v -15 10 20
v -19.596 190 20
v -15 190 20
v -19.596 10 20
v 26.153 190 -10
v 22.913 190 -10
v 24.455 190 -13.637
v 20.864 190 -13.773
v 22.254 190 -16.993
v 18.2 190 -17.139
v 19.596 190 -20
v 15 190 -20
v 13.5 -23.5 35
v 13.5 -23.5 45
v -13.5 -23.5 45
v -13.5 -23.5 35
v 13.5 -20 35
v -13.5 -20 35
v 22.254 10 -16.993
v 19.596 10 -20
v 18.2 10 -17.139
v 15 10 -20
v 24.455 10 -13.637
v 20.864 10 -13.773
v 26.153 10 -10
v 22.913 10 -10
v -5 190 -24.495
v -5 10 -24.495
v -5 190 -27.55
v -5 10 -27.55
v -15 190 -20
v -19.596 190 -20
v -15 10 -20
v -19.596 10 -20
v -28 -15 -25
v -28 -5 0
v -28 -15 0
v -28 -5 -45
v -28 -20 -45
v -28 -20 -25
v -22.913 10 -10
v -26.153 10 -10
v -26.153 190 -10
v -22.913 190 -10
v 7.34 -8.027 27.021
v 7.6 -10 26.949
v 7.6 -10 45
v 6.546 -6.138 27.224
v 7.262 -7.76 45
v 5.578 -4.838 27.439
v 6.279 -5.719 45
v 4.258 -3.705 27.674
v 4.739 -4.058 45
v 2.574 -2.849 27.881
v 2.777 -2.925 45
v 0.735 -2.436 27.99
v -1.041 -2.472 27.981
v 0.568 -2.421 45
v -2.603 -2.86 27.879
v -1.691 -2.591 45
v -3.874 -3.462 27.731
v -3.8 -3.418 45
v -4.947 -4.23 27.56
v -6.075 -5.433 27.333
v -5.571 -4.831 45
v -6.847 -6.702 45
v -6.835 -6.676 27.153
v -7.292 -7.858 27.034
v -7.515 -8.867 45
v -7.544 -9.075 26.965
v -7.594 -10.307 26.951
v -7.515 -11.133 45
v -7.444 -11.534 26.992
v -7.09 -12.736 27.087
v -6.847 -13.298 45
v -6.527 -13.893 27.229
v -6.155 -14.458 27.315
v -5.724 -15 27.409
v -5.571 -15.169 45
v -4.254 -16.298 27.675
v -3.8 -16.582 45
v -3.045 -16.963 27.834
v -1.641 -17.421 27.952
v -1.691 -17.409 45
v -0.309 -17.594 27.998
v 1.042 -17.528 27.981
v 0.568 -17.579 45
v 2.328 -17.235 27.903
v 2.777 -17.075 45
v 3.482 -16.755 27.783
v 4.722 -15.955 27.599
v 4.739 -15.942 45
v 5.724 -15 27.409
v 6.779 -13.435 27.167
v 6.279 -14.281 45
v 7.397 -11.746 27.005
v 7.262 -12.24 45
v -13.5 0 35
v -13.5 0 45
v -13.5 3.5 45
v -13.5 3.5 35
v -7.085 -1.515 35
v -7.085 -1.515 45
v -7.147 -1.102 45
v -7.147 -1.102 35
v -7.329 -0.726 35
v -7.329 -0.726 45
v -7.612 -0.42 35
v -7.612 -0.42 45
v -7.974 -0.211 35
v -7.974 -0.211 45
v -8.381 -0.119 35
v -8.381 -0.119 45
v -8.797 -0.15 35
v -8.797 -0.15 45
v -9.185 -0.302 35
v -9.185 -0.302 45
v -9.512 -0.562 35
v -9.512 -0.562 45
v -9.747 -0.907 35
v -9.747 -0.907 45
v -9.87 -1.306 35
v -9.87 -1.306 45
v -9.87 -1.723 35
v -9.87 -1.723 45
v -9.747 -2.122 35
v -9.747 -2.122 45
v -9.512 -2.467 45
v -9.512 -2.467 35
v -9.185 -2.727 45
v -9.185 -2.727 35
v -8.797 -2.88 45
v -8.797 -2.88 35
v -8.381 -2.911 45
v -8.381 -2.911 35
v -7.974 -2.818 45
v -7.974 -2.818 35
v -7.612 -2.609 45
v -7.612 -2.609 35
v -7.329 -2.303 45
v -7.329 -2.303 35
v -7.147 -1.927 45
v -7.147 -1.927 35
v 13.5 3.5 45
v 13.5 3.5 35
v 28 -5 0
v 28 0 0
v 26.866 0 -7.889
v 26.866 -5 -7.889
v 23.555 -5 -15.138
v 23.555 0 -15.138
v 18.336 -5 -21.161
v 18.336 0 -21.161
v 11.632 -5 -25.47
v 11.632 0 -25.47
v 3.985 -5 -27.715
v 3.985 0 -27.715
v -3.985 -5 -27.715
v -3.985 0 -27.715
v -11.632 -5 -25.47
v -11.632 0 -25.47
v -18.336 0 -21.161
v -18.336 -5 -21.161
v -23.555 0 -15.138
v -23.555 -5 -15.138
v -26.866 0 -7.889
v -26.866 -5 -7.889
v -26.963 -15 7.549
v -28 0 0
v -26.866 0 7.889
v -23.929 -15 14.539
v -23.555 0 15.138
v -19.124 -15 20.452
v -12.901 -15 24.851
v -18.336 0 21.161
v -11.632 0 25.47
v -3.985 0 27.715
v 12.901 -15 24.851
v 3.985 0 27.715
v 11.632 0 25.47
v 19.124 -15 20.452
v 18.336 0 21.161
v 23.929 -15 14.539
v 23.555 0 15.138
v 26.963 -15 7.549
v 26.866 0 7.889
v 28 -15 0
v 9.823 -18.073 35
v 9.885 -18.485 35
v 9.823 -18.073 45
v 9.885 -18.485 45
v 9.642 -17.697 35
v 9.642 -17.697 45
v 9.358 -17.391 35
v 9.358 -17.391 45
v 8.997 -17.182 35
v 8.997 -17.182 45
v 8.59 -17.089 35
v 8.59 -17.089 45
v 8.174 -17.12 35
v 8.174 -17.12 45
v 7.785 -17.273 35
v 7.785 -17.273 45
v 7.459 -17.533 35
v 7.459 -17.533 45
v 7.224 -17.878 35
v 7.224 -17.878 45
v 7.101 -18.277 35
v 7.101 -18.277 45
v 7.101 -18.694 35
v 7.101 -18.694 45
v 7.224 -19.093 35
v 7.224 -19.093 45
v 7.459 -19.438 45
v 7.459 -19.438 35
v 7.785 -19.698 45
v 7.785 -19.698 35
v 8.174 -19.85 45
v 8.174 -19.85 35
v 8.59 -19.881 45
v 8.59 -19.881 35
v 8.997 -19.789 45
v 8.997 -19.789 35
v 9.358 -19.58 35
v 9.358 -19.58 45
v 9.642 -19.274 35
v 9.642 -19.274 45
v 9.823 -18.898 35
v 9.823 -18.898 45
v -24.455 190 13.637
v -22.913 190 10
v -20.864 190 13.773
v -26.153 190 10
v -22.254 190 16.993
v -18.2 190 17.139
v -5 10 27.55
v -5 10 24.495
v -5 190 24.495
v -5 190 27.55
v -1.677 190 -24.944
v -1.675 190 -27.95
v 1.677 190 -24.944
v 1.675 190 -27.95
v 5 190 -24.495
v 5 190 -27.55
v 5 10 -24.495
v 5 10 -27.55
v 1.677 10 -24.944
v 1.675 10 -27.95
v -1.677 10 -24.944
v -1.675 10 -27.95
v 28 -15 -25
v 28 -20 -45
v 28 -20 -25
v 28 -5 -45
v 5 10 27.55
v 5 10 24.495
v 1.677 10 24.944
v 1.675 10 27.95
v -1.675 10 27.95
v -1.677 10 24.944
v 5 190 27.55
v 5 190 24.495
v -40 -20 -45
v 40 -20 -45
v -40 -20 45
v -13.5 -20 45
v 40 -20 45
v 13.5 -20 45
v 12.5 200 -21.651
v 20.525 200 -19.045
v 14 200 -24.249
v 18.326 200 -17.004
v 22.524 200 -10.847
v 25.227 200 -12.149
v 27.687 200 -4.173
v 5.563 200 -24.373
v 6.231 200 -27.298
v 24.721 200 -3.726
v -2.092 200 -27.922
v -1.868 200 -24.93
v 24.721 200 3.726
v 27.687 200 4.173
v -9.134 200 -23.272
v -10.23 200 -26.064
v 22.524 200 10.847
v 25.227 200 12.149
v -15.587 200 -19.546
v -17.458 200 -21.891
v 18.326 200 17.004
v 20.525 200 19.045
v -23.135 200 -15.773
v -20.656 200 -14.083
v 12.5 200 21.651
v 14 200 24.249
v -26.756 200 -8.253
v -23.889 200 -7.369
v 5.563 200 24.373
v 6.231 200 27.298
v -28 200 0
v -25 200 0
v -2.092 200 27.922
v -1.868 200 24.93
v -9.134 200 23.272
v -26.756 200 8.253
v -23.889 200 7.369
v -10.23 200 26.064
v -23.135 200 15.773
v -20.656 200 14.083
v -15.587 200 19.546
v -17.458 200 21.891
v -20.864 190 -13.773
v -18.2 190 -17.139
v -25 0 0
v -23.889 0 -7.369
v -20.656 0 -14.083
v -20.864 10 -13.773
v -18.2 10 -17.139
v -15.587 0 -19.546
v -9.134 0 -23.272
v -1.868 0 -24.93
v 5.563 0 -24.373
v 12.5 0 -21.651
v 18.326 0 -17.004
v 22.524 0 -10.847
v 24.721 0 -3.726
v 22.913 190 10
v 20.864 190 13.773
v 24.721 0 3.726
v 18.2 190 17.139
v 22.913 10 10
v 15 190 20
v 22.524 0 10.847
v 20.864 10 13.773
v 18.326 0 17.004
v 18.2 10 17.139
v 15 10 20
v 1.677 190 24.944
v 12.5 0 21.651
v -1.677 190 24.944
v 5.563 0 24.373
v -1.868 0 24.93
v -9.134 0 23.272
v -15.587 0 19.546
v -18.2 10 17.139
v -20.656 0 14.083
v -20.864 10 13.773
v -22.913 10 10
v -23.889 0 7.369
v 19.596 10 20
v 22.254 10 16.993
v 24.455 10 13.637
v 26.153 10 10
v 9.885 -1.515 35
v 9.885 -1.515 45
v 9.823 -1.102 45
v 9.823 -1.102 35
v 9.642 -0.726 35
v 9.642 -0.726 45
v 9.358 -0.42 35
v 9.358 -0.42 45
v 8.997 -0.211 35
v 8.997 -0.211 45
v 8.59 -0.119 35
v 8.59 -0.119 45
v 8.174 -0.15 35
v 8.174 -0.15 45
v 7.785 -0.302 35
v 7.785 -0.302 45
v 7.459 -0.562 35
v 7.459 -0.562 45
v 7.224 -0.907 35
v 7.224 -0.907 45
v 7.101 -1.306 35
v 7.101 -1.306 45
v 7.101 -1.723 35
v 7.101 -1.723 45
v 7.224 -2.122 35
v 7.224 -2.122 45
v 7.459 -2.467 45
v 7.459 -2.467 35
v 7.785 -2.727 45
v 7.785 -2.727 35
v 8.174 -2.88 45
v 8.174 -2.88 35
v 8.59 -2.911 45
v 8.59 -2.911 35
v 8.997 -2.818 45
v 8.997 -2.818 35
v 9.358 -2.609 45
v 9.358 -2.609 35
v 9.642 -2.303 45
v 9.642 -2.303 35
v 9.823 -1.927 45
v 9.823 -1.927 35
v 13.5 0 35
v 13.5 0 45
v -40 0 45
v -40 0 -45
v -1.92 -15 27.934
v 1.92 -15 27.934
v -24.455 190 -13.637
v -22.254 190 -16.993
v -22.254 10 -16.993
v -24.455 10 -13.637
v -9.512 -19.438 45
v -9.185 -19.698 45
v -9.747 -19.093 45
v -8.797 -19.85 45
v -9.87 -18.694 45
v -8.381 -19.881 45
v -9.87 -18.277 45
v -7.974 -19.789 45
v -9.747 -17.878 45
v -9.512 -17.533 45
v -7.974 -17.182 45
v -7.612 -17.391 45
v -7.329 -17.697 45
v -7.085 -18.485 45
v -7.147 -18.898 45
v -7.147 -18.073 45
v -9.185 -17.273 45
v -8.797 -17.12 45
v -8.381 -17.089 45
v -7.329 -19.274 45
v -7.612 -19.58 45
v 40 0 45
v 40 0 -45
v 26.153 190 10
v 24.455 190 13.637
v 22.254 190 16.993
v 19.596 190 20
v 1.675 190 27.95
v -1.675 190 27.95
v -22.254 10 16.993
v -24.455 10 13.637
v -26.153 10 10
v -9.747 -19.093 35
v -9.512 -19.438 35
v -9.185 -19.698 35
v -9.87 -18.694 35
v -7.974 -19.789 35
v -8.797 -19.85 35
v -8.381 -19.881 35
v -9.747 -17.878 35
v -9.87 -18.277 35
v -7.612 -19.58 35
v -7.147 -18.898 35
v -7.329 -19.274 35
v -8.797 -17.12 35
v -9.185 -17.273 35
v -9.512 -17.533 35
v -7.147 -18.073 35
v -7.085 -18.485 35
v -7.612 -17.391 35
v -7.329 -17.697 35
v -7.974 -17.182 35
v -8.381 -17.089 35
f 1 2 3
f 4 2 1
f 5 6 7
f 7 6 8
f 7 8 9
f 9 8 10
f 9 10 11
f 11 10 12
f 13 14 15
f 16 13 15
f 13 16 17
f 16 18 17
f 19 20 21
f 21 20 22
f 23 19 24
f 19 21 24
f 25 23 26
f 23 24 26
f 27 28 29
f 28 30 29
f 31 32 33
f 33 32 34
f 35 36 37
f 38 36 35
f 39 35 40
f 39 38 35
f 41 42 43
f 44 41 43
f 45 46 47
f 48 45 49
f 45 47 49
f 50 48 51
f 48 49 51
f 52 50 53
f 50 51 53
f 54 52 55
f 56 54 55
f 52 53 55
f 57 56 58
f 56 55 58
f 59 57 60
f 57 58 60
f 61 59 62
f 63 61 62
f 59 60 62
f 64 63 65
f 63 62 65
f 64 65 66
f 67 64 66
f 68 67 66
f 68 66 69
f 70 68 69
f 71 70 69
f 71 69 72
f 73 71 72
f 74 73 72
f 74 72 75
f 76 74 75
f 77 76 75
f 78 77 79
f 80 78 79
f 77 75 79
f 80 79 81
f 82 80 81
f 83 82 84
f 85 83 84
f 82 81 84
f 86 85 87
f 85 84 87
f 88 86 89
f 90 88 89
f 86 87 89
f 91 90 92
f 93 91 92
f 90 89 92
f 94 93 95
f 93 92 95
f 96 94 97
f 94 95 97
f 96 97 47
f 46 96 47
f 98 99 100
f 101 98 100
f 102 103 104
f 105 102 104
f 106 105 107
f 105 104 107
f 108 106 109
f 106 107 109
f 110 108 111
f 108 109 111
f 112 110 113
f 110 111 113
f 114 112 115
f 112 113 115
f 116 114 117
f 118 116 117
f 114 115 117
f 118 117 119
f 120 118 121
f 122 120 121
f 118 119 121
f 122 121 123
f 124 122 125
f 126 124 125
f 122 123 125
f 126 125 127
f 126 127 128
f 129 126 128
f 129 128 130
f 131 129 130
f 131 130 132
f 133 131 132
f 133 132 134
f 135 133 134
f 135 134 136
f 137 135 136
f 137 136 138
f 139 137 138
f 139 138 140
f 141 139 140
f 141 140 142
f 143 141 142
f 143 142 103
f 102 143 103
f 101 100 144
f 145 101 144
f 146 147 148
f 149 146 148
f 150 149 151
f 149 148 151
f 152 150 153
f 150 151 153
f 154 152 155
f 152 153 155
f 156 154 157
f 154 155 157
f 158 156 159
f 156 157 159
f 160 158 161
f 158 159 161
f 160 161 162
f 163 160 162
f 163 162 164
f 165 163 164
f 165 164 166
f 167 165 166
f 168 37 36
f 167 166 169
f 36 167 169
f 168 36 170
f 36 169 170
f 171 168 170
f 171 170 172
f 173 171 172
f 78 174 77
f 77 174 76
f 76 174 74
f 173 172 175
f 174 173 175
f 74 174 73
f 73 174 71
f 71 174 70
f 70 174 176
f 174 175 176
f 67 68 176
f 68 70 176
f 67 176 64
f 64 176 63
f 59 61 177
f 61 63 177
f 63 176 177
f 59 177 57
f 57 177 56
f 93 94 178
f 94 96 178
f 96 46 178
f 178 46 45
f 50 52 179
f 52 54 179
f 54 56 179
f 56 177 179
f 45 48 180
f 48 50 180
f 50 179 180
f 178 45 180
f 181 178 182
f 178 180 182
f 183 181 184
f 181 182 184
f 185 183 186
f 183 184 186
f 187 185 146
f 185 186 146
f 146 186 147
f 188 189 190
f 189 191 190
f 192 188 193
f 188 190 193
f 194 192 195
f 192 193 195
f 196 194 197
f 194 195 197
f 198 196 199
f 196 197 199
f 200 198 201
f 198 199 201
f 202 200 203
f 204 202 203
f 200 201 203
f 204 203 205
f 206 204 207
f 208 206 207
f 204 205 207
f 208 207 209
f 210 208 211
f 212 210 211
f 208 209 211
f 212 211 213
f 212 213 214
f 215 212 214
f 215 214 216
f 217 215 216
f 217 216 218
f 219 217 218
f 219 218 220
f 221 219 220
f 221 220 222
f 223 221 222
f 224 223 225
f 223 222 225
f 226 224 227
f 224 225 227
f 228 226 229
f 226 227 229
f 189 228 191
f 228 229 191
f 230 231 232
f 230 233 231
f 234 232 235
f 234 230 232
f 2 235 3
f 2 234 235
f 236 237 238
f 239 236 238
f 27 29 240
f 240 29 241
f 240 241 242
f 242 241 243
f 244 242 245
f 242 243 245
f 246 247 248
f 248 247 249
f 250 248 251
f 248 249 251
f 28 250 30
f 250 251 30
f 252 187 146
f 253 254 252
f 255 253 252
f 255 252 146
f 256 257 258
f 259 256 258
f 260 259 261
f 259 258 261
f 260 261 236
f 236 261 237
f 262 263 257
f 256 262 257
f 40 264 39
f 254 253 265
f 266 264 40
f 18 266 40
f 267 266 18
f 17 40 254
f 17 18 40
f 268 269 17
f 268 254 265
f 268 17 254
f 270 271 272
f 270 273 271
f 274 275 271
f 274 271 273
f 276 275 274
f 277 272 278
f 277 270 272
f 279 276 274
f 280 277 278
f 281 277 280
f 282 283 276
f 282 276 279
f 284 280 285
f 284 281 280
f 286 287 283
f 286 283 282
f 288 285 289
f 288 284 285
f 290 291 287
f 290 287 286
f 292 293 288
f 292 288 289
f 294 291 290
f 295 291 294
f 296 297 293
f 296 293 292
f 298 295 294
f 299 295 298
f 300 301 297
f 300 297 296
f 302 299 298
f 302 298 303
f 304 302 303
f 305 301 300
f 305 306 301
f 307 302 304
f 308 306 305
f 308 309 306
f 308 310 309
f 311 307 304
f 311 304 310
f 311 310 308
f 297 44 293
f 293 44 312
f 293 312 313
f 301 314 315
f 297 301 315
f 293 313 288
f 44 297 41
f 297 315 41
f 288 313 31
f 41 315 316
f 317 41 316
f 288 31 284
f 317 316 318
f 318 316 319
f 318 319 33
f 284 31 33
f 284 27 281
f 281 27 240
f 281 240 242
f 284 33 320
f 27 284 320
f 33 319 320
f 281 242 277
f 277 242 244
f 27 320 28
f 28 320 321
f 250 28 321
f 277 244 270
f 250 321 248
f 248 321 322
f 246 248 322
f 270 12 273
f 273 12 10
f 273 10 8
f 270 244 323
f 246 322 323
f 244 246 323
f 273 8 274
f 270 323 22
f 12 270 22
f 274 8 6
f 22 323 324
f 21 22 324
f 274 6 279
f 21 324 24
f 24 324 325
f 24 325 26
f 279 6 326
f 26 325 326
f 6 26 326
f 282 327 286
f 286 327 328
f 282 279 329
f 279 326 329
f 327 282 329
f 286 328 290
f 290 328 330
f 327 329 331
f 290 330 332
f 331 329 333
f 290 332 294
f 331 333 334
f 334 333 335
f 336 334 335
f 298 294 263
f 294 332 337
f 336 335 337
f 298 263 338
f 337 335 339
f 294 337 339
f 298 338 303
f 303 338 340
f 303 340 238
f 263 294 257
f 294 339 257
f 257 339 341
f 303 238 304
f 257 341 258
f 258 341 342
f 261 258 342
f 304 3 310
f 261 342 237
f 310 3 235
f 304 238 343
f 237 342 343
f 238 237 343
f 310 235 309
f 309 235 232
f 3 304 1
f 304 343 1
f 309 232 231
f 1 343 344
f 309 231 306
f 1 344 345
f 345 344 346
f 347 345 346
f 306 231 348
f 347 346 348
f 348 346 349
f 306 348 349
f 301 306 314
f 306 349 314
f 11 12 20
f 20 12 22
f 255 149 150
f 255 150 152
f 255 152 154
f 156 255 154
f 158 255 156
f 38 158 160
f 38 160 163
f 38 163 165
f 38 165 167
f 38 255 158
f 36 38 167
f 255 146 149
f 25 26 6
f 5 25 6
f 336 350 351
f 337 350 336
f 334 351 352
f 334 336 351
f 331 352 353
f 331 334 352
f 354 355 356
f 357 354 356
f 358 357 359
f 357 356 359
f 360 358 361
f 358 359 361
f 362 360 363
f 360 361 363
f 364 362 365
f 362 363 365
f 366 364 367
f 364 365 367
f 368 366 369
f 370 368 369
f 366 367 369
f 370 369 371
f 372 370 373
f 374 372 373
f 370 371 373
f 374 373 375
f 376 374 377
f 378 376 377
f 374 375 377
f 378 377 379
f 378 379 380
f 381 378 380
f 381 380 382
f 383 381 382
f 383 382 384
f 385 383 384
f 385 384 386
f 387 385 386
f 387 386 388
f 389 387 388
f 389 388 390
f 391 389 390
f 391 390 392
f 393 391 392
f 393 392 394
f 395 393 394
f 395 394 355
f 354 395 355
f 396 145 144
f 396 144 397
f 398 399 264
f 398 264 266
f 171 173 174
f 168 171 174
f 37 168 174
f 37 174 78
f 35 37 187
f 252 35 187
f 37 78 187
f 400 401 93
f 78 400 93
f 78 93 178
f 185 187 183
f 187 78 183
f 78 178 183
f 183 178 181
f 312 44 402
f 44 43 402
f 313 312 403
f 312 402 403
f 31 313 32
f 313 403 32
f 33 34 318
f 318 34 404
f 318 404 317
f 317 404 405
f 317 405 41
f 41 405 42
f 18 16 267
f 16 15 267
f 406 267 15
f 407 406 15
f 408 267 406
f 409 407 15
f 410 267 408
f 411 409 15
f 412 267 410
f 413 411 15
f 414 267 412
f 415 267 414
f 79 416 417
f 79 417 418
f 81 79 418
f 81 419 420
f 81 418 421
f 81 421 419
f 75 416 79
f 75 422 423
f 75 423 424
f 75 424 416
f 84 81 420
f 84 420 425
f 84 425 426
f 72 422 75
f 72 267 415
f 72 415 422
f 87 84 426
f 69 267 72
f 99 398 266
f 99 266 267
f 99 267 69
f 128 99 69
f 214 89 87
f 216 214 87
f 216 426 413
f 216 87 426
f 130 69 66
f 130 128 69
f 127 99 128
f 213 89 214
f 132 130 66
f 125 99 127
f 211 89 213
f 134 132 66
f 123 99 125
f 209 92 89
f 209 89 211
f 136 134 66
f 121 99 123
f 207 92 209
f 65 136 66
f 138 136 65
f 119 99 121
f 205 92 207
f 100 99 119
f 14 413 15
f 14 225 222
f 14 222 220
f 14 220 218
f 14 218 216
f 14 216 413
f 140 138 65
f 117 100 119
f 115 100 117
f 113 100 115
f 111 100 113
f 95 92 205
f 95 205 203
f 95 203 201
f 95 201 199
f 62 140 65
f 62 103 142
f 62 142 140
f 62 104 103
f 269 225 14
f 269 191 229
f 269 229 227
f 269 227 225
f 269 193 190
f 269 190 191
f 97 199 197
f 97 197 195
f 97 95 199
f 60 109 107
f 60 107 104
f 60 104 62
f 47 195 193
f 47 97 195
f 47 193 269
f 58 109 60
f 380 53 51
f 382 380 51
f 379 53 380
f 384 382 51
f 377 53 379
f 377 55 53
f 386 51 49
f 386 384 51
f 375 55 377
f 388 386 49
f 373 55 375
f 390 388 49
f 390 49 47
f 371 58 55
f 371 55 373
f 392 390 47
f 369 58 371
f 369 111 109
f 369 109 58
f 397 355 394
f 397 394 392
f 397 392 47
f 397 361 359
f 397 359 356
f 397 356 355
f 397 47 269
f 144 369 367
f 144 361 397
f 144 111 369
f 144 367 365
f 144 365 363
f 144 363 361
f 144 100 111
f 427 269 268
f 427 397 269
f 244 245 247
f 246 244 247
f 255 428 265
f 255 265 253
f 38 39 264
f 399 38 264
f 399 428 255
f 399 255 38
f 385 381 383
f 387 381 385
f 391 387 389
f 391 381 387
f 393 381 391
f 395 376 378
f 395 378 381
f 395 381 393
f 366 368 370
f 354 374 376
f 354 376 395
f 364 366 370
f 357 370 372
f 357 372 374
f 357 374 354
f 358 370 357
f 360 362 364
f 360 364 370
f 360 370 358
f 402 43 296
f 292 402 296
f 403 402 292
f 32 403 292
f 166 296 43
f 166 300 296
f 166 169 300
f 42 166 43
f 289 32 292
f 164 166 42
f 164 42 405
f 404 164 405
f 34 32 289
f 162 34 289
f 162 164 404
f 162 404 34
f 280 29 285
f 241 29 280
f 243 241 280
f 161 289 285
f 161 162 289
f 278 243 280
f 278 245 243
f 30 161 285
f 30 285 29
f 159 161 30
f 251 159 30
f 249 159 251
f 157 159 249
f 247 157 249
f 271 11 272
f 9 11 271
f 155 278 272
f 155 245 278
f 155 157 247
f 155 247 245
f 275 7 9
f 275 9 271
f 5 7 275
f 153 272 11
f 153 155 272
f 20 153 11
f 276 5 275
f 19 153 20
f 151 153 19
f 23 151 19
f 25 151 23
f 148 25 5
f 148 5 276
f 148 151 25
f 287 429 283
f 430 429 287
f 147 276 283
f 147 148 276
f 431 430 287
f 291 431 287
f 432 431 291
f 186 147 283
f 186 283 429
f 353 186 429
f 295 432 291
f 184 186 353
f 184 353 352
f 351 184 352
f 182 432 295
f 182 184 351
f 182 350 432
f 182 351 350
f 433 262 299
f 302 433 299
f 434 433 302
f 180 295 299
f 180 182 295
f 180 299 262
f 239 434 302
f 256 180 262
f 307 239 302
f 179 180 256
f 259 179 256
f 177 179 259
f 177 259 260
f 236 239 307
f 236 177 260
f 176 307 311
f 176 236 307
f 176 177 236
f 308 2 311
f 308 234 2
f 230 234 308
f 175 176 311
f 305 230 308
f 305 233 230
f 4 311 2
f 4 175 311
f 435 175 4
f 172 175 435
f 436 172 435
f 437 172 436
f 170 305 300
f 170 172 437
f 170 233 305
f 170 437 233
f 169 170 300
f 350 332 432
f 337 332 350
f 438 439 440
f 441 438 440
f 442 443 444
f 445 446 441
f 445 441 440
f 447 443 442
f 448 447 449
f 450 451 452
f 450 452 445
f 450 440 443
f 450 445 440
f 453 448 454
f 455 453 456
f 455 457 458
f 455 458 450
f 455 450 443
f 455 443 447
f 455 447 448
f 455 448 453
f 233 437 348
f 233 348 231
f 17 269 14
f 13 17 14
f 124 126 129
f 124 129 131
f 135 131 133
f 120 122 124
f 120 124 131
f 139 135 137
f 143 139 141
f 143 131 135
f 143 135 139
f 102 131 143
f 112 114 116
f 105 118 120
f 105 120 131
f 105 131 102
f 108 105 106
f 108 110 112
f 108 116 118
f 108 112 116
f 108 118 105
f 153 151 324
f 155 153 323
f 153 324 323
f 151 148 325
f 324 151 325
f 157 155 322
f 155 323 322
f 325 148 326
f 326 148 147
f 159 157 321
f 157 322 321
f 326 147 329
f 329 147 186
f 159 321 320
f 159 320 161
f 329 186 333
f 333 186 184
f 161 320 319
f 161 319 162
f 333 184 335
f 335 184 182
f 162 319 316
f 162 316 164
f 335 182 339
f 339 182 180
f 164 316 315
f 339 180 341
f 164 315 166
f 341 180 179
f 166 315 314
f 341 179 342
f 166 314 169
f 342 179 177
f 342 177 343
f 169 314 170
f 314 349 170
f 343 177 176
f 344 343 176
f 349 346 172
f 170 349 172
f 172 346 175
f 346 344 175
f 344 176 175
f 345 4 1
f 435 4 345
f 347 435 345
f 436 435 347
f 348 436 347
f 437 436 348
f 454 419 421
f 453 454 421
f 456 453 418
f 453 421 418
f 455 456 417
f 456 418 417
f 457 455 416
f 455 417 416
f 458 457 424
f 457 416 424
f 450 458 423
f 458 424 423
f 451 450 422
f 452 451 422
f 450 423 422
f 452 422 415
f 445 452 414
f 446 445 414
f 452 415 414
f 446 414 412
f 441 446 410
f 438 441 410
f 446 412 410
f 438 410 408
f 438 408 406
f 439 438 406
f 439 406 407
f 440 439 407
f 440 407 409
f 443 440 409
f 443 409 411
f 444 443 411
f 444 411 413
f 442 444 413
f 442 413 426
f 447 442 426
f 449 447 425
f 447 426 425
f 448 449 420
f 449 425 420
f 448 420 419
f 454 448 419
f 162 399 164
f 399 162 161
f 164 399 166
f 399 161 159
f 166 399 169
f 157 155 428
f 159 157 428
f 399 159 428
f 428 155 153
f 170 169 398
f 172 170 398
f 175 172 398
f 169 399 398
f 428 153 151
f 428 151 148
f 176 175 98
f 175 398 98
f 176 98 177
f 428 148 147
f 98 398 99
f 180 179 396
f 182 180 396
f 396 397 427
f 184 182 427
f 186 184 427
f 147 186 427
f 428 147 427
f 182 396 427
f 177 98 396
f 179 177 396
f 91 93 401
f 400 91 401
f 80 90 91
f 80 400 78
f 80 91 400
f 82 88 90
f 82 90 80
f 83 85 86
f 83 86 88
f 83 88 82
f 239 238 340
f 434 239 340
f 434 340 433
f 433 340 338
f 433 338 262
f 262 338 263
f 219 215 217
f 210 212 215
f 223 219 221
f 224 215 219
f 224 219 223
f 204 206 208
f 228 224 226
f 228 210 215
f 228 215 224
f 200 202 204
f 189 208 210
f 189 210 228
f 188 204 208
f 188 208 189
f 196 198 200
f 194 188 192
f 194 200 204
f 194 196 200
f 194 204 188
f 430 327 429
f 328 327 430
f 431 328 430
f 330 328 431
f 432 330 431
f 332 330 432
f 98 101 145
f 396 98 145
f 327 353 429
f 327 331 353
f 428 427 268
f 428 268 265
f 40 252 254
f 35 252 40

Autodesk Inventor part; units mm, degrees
ref_plane "YZ Plane" through (0, 0, 0) normal (1, 0, 0) x (0, 1, 0)
ref_plane "XZ Plane" through (0, 0, 0) normal (0, 1, 0) x (-1, 0, 0)
ref_plane "XY Plane" through (0, 0, 0) normal (0, 0, 1) x (1, 0, 0)
sketch "Sketch1" plane through (0, 0, 0) normal (0, 1, 0) x (-1, 0, 0)
  circle A0 centre (0, 0) radius 25
  circle A1 centre (0, 0) radius 28
  dimension "d0" = 50
  dimension "d1" = 56
extrude "Extrusion1" add sketch "Sketch1" along normal blind 200
sketch "Sketch2" plane through (0, 0, 0) normal (1, 0, 0) x (0, 1, 0)
  line L0 (0, 0) -> (0, 15)
  line L1 (0, -28) -> (0, 28) projected
  line L2 (0, 15) -> (100, 15)
  line L3 (190, 20) -> (10, 20)
  line L4 (10, 20) -> (10, 10)
  line L5 (10, 10) -> (190, 10)
  line L6 (190, 10) -> (190, 20)
  line L7 (190, 20) -> (10, 10) construction
  line L8 (10, 20) -> (190, 10) construction
  line L9 (0, 0) -> (25, 0)
  line L10 (190, -20) -> (10, -20)
  line L11 (10, -20) -> (10, -10)
  line L12 (10, -10) -> (190, -10)
  line L13 (190, -10) -> (190, -20)
  line L14 (190, -20) -> (10, -10) construction
  line L15 (10, -20) -> (190, -10) construction
  point P0 (100, -15)
  dimension "d4" = 15
  dimension "d5" = 100
  dimension "d6" = 180
  dimension "d7" = 10
  dimension "d8" = 25
extrude "Extrusion2" cut sketch "Sketch2" along normal mid plane 100
sketch "Sketch4" plane through (0, 0, 0) normal (0, 0, 1) x (1, 0, 0)
  line L0 (0, 0) -> (0, 100)
  line L1 (-5, 190) -> (5, 190)
  line L2 (5, 190) -> (5, 10)
  line L3 (5, 10) -> (-5, 10)
  line L4 (-5, 10) -> (-5, 190)
  line L5 (-5, 190) -> (5, 10) construction
  line L6 (5, 190) -> (-5, 10) construction
  dimension "d11" = 100
  dimension "d12" = 10
  dimension "d13" = 180
extrude "Extrusion3" cut sketch "Sketch4" along normal mid plane 100
sketch "Sketch5" plane through (0, 0, 0) normal (0, -1, 0) x (1, 0, 0)
  line L0 (-40, 45) -> (40, 45)
  line L1 (40, 45) -> (40, -45)
  line L2 (40, -45) -> (-40, -45)
  line L3 (-40, -45) -> (-40, 45)
  line L4 (-40, 45) -> (40, -45) construction
  line L5 (40, 45) -> (-40, -45) construction
  circle A0 centre (0, 0) radius 28
  dimension "d16" = 80
  dimension "d17" = 90
  dimension "d18" = 56
extrude "Extrusion4" add sketch "Sketch5" along normal blind 20
sketch "Sketch6" plane through (-40, 0, 45) normal (0, 0, 1) x (1, 0, 0)
  circle A0 centre (40, -10) radius 7.6
  point P0 (40, 0)
  dimension "d21" = 15.2
extrude "Extrusion5" cut sketch "Sketch6" against normal blind 20
sketch "Sketch7" plane through (0, -20, 0) normal (0, -1, 0) x (1, 0, 0)
  circle A0 centre (0, 0) radius 28 projected
extrude "Extrusion6" add sketch "Sketch7" against normal blind 5
sketch "Sketch8" plane through (40, 0, -45) normal (0, 0, -1) x (-1, 0, 0)
  line L0 (12, 0) -> (12, 200) projected
  line L1 (68, 0) -> (68, 200) projected
  line L2 (80, 0) -> (0, 0) projected
  line L3 (40, 0) -> (40, -10)
  line L4 (12, -15) -> (68, -15) projected
  line L5 (12, -5) -> (68, -5)
  line L6 (68, -5) -> (68, -15)
  line L7 (68, -15) -> (12, -15)
  line L8 (12, -15) -> (12, -5)
  circle A0 centre (40, -10) radius 7.6 projected
  line L9 (12, -5) -> (68, -15) construction
  line L10 (68, -5) -> (12, -15) construction
  point P0 (45.7236, -15)
  point P1 (34.2764, -15)
  dimension "d26" = 10
extrude "Extrusion7" cut sketch "Sketch8" against normal blind 45 contours L5 A0 L4 | L5 L6 L4 A0 | A0 L4 L8 L5
sketch "Sketch9" plane through (-40, 0, 45) normal (0, 0, 1) x (1, 0, 0)
  circle A0 centre (40, -10) radius 7.6 projected
  line L0 (26.5, 3.5) -> (53.5, 3.5)
  line L1 (53.5, 3.5) -> (53.5, -23.5)
  line L2 (53.5, -23.5) -> (26.5, -23.5)
  line L3 (26.5, -23.5) -> (26.5, 3.5)
  line L4 (26.5, 3.5) -> (53.5, -23.5) construction
  line L5 (53.5, 3.5) -> (26.5, -23.5) construction
  circle A1 centre (40, -10) radius 12
  line L6 (53.5, 3.5) -> (26.5, -23.5)
  circle A2 centre (48.4853, -1.5147) radius 1.4
  circle A3 centre (31.5147, -1.5147) radius 1.4
  circle A4 centre (31.5147, -18.4853) radius 1.4
  circle A5 centre (48.4853, -18.4853) radius 1.4
  point P0 (40, 0)
  dimension "d31" = 24
  dimension "d29" = 27
  dimension "d30" = 27
  dimension "d32" = 2.8
  dimension "d39" = 360
extrude "Extrusion8" add sketch "Sketch9" against normal blind 10 contours A0 L6 A2 A1 A5 A4 | A0 L6 A4 A1 A3 A2 | A1 A3 A4 L6 L3 L0 A2 | A2 L6 L1 L2 A4 A1 A5
extrude "Extrusion9" cut sketch "Sketch9" against normal blind 10 contours A2 A1 L6 | L6 A1 A2 | A4 A1 L6 | L6 A1 A4 | L6 A2 A1 | A1 A2 L6 | L6 A4 A1 | A1 A4 L6 | A3 A1 | A1 A3 | A5 A1 | A1 A5
sketch "Sketch10" plane through (40, 0, -45) normal (0, 0, -1) x (-1, 0, 0)
  line L0 (68, -15) -> (12, -15) projected
  line L1 (53.5, -20) -> (80, -20) projected
  line L2 (12, -10) -> (68, -10)
  line L3 (68, -10) -> (68, -20)
  line L4 (68, -20) -> (12, -20)
  line L5 (12, -20) -> (12, -10)
  line L6 (12, -10) -> (68, -20) construction
  line L7 (68, -10) -> (12, -20) construction
  point P0 (40, 0)
  point P1 (40, -15)
extrude "Extrusion10" cut sketch "Sketch10" against normal blind 20
properties part number "TUBO CONTENEDOR"
